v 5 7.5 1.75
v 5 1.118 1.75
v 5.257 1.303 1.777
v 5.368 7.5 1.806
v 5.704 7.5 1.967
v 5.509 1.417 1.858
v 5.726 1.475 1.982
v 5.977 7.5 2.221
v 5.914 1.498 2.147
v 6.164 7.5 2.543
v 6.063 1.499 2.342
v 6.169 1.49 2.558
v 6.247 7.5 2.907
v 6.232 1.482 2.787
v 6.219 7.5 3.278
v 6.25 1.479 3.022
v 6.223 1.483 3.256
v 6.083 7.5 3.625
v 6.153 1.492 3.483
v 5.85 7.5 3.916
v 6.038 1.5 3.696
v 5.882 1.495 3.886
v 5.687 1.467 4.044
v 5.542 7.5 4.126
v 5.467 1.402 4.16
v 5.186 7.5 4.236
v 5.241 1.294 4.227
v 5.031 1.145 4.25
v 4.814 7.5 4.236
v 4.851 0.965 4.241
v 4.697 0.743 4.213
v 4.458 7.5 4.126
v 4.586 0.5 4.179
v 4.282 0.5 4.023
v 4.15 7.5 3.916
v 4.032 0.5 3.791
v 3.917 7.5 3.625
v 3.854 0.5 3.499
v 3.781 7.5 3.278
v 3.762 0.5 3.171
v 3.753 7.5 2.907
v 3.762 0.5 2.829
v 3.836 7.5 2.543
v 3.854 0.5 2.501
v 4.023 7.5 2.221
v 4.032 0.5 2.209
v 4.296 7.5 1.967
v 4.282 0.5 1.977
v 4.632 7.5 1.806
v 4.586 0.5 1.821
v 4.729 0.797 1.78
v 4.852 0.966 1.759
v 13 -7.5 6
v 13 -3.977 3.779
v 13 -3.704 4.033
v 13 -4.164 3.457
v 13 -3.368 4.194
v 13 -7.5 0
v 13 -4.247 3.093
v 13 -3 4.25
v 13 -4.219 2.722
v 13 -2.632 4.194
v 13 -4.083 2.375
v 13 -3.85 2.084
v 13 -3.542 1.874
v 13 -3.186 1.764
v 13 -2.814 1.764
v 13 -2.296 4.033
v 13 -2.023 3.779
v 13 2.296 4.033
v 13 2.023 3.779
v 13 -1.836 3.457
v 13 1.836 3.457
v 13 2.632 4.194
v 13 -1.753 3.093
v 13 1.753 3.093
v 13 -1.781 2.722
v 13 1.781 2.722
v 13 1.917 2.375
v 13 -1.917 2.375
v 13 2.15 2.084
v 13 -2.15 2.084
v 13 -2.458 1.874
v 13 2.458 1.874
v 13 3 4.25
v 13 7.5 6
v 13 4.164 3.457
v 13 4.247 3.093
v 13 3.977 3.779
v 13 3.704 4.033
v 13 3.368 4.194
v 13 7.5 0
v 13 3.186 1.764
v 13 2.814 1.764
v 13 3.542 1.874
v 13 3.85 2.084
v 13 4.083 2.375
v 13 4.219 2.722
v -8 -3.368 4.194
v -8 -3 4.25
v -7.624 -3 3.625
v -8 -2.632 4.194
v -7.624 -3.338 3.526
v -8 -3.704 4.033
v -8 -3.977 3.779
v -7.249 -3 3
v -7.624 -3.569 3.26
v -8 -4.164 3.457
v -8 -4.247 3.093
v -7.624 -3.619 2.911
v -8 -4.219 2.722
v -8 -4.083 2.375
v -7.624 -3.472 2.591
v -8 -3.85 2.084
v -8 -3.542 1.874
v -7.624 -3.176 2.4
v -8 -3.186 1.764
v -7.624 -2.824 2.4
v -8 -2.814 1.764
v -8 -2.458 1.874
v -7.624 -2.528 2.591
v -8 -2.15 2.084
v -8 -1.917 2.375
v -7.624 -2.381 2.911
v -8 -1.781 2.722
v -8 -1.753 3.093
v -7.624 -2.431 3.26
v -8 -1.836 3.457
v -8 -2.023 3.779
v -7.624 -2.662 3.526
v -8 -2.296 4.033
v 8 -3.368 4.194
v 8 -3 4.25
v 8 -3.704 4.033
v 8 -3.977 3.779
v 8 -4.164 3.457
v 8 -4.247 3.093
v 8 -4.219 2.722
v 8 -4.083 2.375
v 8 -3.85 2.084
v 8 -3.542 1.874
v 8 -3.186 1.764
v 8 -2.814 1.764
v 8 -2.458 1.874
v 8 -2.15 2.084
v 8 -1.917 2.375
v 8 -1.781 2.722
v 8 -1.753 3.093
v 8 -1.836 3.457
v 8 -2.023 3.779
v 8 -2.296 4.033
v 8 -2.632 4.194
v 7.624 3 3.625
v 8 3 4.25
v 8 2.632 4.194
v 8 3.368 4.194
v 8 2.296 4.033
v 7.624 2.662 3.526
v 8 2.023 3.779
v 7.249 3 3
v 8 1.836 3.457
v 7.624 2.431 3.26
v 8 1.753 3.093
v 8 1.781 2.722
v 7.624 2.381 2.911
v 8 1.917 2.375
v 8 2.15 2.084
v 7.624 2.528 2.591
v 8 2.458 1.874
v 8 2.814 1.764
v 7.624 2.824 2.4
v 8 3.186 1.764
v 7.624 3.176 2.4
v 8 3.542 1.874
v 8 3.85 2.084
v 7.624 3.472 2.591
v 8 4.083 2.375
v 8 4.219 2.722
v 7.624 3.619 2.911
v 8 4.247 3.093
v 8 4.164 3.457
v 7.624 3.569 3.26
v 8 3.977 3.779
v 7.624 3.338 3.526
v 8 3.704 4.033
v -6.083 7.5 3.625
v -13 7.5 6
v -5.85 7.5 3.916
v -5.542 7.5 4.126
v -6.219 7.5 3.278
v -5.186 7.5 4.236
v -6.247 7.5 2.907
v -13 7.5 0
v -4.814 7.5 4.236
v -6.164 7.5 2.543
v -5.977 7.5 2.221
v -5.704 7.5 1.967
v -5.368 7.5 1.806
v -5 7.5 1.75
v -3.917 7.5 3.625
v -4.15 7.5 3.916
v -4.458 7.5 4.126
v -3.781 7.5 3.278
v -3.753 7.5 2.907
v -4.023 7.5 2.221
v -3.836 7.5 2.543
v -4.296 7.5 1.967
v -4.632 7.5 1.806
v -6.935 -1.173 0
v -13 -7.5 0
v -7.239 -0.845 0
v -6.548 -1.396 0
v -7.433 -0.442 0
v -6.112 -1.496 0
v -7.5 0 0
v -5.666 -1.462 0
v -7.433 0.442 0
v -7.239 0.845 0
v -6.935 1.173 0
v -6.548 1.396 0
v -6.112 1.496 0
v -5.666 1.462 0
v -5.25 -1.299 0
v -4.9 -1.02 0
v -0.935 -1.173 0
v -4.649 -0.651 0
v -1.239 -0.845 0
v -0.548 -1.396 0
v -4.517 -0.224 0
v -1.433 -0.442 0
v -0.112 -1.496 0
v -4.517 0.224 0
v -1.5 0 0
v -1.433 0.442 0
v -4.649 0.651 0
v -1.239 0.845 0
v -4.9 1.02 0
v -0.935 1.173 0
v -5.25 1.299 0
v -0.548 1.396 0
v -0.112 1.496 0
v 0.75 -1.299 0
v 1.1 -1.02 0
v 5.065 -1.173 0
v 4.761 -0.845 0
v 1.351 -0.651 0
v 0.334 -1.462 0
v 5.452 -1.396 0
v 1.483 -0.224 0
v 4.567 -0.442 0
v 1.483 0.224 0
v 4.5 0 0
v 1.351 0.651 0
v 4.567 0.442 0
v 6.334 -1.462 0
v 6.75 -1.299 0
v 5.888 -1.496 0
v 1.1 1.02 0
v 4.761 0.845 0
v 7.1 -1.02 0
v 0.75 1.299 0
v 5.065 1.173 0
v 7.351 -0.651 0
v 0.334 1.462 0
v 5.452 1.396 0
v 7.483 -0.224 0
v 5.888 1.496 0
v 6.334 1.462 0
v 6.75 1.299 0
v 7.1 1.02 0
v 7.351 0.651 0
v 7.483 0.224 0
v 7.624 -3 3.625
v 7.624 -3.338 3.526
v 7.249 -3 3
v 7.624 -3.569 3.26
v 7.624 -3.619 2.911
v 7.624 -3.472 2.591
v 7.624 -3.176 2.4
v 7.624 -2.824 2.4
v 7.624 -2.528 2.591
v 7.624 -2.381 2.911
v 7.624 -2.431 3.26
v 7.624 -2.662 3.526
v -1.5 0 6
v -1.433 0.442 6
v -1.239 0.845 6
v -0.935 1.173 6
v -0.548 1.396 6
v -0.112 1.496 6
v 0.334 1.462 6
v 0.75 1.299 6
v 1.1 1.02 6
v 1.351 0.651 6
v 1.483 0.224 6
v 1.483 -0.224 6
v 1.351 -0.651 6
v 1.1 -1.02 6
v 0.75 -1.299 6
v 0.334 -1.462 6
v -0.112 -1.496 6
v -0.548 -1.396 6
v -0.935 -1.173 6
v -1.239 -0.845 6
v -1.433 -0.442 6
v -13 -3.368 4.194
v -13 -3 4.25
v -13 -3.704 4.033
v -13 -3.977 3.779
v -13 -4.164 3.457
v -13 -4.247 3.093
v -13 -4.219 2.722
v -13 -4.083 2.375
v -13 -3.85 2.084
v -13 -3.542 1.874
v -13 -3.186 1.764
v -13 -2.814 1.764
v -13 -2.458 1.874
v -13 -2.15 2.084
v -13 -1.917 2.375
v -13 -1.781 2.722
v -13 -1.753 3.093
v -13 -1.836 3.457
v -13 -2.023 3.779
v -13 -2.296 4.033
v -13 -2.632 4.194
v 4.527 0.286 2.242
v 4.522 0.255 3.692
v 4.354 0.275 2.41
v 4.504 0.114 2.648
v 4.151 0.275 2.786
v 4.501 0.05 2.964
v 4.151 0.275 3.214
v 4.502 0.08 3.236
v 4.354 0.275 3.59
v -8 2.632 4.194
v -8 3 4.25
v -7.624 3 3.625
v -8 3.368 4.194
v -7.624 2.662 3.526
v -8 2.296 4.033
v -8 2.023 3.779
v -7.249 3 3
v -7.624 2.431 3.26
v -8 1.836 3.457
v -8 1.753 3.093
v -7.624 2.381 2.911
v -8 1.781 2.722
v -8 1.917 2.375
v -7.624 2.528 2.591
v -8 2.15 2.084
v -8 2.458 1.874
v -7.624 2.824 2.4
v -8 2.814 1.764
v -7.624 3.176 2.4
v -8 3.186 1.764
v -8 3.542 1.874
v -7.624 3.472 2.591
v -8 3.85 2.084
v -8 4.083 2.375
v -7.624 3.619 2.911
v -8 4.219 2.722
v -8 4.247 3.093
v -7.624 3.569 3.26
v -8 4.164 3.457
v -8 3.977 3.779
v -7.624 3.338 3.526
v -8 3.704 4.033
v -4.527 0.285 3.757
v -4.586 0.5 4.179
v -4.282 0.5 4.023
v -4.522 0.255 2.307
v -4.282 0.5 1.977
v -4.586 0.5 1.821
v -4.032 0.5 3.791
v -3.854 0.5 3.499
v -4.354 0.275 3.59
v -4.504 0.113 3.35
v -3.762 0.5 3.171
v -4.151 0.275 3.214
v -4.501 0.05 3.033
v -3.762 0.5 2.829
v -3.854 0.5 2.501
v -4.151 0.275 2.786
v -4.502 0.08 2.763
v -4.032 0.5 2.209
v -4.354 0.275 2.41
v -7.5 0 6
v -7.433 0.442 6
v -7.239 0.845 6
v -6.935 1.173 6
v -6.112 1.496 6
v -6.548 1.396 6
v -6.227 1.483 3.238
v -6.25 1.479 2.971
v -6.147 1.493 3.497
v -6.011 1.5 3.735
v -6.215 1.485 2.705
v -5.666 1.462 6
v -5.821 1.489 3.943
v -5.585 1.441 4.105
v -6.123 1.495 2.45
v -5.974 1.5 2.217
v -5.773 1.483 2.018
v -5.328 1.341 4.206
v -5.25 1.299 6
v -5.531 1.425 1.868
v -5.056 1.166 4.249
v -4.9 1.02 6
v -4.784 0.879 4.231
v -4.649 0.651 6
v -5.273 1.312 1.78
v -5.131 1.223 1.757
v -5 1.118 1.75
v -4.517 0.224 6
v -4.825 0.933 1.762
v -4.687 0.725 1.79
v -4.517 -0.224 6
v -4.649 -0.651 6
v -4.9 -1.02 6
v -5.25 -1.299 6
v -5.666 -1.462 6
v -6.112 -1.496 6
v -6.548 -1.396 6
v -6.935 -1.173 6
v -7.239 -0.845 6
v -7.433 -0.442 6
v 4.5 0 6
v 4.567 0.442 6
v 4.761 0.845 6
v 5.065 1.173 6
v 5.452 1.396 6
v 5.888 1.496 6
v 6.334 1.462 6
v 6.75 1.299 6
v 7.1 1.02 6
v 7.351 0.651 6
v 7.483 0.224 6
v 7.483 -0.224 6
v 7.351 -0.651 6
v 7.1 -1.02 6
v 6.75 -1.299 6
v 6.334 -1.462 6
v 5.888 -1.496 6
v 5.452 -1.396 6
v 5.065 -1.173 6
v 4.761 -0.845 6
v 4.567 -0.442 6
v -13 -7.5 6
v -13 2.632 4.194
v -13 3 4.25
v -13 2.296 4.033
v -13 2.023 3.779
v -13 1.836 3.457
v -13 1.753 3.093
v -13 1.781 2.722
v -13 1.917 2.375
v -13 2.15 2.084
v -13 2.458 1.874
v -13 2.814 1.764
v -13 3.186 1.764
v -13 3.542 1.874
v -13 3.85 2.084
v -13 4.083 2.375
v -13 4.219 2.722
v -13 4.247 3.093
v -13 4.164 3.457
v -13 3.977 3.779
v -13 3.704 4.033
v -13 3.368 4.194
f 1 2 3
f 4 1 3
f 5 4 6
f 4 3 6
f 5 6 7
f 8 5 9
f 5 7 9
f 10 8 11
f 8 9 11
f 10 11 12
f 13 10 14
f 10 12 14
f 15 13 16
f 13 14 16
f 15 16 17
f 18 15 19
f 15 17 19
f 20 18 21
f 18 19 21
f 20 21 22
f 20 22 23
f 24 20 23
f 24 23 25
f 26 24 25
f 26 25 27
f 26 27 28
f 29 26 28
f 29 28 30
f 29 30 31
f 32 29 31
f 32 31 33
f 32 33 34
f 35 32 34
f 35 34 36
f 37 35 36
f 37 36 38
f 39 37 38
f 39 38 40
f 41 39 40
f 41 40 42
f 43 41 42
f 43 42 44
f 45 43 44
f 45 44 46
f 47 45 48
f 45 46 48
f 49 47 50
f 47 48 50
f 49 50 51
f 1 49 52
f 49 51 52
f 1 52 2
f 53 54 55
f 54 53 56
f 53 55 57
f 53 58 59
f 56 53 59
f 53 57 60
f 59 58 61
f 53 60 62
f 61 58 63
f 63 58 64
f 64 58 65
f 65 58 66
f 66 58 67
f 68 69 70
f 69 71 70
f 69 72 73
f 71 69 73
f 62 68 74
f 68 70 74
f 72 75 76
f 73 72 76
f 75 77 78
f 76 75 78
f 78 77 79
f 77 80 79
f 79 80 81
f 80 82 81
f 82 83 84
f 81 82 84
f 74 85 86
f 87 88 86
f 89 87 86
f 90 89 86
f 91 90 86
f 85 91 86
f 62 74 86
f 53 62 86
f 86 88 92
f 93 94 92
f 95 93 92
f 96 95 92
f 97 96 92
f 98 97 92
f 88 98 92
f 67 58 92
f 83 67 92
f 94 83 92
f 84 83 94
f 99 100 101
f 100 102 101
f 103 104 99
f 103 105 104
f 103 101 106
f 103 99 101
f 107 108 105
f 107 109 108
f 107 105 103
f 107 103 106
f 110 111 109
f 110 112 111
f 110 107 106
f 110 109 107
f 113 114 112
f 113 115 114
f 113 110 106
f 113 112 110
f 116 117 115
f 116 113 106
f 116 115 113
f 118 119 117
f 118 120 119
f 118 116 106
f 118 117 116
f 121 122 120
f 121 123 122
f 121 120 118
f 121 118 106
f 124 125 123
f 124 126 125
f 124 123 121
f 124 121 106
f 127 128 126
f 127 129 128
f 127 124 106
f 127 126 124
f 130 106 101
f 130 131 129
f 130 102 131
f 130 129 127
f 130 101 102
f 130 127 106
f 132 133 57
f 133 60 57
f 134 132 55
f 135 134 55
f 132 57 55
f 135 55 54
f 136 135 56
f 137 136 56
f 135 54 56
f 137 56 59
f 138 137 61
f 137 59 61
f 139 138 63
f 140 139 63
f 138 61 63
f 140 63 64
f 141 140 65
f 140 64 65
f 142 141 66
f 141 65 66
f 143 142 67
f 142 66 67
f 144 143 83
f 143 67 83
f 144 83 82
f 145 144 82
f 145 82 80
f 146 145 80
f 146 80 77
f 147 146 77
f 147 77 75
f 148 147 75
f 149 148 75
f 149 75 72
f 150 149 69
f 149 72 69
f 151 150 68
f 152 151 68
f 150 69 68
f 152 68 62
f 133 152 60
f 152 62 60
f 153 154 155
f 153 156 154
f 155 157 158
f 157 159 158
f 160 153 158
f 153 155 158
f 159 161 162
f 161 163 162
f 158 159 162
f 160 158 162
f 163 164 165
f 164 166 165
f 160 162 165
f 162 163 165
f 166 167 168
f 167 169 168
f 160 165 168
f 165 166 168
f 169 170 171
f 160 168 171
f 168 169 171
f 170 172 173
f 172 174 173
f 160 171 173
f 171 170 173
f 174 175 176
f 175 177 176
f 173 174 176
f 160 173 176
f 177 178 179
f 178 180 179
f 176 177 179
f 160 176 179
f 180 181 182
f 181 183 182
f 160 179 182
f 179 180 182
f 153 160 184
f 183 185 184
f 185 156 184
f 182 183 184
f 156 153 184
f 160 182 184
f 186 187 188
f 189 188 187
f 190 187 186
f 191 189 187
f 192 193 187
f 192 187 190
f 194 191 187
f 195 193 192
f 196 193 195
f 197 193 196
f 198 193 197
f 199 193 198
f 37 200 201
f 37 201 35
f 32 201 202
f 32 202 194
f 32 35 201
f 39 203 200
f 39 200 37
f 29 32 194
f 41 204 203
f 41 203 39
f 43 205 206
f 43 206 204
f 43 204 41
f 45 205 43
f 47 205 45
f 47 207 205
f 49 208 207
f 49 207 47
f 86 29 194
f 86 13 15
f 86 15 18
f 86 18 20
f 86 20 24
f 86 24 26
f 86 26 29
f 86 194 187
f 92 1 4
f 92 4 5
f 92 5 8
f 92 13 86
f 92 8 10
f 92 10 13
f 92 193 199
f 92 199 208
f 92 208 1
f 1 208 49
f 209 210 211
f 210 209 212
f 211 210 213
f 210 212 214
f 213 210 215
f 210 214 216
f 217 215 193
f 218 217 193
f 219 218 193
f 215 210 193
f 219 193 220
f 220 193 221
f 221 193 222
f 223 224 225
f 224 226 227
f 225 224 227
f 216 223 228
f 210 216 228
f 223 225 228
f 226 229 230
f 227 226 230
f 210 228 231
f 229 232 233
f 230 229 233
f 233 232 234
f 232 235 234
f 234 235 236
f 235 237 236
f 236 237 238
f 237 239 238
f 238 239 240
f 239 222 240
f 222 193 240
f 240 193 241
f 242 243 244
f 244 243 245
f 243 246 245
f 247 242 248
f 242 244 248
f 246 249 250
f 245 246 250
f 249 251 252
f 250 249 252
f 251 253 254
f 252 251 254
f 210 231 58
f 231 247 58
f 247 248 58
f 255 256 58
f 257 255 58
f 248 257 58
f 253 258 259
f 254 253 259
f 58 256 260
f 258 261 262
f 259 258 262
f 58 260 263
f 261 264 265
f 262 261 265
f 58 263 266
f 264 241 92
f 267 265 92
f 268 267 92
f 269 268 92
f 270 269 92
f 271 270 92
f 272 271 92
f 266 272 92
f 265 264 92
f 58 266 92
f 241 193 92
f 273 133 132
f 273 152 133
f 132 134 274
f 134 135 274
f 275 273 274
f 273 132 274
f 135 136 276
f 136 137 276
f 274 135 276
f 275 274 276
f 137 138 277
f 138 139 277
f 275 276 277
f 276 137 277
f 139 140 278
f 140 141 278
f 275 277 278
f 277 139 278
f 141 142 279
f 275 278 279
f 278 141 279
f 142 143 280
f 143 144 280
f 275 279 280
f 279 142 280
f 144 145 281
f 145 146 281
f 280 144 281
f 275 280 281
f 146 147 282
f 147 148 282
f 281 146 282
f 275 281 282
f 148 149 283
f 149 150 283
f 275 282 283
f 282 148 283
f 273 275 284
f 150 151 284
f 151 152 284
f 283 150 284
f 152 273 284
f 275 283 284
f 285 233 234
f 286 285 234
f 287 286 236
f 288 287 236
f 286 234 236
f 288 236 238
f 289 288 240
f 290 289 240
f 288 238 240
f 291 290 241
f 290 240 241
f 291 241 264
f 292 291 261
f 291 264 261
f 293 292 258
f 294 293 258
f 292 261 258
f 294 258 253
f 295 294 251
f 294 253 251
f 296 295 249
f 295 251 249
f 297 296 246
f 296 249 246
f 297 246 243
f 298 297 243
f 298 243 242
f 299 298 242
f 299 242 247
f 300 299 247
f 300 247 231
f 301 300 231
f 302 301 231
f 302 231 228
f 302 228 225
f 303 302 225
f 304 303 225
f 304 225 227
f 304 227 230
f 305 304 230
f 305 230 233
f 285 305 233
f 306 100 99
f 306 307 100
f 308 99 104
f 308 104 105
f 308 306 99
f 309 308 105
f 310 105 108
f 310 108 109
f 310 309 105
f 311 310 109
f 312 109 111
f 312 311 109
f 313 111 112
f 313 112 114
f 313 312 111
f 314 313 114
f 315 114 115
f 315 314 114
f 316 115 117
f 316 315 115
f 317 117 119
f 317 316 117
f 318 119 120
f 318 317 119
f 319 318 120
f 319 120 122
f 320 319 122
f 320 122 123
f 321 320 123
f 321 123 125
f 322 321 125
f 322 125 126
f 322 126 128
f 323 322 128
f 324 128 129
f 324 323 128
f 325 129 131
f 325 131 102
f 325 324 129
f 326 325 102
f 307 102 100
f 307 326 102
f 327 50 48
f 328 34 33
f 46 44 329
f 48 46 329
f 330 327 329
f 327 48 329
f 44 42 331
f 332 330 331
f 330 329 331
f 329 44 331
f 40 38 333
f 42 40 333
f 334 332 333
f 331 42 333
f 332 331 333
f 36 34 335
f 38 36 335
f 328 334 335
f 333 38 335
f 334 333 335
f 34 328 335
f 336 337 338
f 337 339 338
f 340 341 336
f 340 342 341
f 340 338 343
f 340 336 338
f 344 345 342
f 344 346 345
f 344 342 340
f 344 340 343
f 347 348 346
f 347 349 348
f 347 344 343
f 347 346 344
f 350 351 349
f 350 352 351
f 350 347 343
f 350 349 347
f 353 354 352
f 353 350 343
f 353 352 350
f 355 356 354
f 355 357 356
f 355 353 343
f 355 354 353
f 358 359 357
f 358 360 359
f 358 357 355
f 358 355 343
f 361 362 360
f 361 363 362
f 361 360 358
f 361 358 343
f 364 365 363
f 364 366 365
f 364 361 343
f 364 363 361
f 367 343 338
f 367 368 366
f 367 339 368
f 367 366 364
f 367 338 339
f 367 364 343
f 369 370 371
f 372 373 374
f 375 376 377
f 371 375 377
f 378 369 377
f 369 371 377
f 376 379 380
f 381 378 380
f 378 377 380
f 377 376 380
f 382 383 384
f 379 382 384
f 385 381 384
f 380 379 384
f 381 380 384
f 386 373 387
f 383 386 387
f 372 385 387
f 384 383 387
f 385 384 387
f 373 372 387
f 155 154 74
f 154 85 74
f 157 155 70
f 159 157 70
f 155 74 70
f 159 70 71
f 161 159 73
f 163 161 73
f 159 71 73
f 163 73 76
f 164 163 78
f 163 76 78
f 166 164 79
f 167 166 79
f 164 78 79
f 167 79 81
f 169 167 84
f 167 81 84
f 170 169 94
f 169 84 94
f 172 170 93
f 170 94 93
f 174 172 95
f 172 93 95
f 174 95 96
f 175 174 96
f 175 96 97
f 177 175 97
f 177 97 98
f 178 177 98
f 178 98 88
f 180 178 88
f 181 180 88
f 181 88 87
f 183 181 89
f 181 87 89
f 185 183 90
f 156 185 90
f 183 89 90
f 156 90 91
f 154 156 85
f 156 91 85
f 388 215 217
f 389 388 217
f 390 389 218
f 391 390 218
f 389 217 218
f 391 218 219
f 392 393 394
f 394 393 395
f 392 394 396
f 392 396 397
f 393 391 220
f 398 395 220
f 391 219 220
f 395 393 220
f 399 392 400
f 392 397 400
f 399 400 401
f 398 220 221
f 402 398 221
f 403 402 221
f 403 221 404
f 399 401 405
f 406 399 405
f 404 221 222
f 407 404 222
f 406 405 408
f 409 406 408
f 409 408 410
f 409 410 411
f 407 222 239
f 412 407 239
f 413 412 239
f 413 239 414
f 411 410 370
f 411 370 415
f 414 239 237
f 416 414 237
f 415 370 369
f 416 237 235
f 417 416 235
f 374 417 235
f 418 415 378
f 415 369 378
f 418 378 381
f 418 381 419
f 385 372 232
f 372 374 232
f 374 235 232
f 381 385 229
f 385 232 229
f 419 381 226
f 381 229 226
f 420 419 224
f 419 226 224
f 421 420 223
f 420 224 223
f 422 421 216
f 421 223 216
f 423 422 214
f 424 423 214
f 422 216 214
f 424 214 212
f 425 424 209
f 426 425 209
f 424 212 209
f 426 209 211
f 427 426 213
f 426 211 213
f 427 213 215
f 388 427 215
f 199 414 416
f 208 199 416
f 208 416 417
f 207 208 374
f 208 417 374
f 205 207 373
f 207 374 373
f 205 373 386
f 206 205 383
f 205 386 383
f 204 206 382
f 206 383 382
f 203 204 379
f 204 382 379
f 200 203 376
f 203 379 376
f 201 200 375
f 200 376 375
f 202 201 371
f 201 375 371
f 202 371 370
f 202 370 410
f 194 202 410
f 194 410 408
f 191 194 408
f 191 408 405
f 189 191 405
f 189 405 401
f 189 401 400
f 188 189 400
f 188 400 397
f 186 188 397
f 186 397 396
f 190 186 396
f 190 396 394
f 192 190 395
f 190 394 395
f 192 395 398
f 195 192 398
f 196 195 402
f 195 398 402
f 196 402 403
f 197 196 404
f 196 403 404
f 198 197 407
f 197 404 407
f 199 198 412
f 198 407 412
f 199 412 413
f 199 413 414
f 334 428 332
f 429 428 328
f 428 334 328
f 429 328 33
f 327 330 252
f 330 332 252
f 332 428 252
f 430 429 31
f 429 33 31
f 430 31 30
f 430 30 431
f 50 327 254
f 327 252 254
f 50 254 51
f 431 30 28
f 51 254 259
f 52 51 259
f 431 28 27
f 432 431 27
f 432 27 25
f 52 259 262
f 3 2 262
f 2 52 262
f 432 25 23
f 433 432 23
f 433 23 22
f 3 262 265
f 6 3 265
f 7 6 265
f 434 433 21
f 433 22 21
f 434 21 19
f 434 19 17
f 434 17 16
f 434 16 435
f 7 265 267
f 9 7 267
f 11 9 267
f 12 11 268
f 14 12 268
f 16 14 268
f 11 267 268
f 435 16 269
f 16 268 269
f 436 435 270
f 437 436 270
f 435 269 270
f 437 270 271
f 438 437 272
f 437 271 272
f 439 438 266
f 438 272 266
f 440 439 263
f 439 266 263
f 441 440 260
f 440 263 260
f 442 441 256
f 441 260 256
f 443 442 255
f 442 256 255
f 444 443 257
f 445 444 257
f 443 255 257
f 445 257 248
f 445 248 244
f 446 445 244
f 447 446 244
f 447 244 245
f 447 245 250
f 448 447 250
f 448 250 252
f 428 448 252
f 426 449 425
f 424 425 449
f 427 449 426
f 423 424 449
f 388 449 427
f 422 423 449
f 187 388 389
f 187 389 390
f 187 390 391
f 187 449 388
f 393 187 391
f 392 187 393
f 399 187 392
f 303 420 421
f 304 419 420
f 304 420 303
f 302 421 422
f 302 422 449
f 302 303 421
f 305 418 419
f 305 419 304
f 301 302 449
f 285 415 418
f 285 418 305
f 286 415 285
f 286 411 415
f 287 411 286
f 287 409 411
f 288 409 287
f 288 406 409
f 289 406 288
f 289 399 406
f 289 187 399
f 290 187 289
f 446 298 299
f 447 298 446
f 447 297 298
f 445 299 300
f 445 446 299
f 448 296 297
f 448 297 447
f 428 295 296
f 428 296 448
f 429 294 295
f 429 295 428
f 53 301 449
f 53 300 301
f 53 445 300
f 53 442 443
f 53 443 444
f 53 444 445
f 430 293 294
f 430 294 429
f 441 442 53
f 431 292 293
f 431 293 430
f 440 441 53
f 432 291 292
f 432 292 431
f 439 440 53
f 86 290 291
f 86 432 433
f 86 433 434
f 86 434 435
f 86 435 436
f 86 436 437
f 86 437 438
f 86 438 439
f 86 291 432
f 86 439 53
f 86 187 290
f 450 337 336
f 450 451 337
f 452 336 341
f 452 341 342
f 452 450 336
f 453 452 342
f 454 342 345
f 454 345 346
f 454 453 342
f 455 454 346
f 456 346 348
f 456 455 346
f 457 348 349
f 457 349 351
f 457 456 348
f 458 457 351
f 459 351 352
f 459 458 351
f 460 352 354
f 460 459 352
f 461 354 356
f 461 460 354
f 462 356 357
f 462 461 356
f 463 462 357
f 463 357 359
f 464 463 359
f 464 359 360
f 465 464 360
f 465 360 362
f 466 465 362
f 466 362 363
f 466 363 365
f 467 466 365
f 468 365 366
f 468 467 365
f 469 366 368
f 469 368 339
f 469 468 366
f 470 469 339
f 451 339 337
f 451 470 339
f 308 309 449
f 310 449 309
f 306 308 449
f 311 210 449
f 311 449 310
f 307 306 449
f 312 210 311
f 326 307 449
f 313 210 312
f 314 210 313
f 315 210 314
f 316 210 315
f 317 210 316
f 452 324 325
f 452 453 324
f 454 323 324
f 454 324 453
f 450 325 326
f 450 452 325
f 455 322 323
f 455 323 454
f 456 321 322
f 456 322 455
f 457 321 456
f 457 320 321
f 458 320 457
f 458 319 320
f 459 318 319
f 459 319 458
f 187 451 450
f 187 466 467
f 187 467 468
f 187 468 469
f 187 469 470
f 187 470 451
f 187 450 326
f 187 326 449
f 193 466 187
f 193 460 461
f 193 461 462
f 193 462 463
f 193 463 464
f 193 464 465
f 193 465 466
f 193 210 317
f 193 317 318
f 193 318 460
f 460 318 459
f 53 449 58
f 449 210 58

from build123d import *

# Parameters (mm, degrees)
SKETCH_1_W                  = 26
SKETCH_1_H                  = 15
EXTRUDE_1_DEPTH             = 5
SKETCH_2_W                  = 26
SKETCH_2_H                  = 15
EXTRUDE_2_DEPTH             = 1
HOLE_WIZARD_M3_1_AT_2_COUNT = 2
HOLE_WIZARD_M3_1_AT_2_PITCH = 6
SKETCH_5_R                  = 1.5
CUT_EXTRUDE_1_DEPTH         = 7
HOLE_WIZARD_M3_2_D          = 2.5
HOLE_WIZARD_M3_2_DEPTH      = 7
HOLE_WIZARD_M3_2_TIP        = 0.751075774


with BuildPart() as part:
    # 草图1 → 凸台-拉伸1 (new body)
    with BuildSketch(Plane.XY):
        Rectangle(SKETCH_1_W, SKETCH_1_H)
    extrude(amount=EXTRUDE_1_DEPTH)

    # 草图2 → 凸台-拉伸2 (add)
    with BuildSketch(Plane.XY.offset(5)):
        Rectangle(SKETCH_2_W, SKETCH_2_H)
    extrude(amount=EXTRUDE_2_DEPTH)

    # 草图4 → M3 螺纹孔1 (revolve, cut)
    with BuildSketch(Plane(origin=(-13, -3, 3), x_dir=(0, 0, 1), z_dir=(0, 1, 0))):
        Polygon((0, 0), (0, 5.751075774), (1.25, 5), (1.25, 0), align=None)
    hole_wizard_m3_1 = revolve(axis=Axis((-19.35, -3, 3), (1, 0, 0)), mode=Mode.SUBTRACT)

    # M3 螺纹孔1 at 2: M3 螺纹孔1 ×2
    with Locations(*[(0, i * HOLE_WIZARD_M3_1_AT_2_PITCH, 0) for i in range(1, HOLE_WIZARD_M3_1_AT_2_COUNT)]):
        add(hole_wizard_m3_1, mode=Mode.SUBTRACT)

    # 镜向1: M3 螺纹孔1 across plane
    add(hole_wizard_m3_1.mirror(Plane(origin=(0, 0, 0), x_dir=(0, 0, 1), z_dir=(1, 0, 0))), mode=Mode.SUBTRACT)

    # 镜向1 copy 1 sketch → 镜向1 copy 1 (revolve, cut)
    with BuildSketch(Plane(origin=(13, 3, 3), x_dir=(0, 0, 1), z_dir=(0, 1, 0))):
        Polygon((0, 0), (0, -5.751075774), (1.25, -5), (1.25, 0), align=None)
    revolve(axis=Axis((19.35, 3, 3), (1, 0, 0)), mode=Mode.SUBTRACT)

    # 草图5 → 切除-拉伸1 (cut)
    with BuildSketch(Plane(origin=(0, 0, 0), x_dir=(-1, 0, 0), z_dir=(0, 0, -1))):
        with Locations((6, 0)):
            Circle(SKETCH_5_R)
        Circle(SKETCH_5_R)
        with Locations((-6, 0)):
            Circle(SKETCH_5_R)
    extrude(amount=-CUT_EXTRUDE_1_DEPTH, mode=Mode.SUBTRACT)

    # M3 螺纹孔2
    with Locations(Plane(origin=(5, 7.5, 3), x_dir=(0, 0, 1), z_dir=(0, 1, 0))):
        with Locations((0, 0), (0, -10)):
            Hole(HOLE_WIZARD_M3_2_D / 2, depth=HOLE_WIZARD_M3_2_DEPTH)
            with Locations((0, 0, -(HOLE_WIZARD_M3_2_DEPTH + HOLE_WIZARD_M3_2_TIP / 2))):  # 118° drill point
                Cone(0, HOLE_WIZARD_M3_2_D / 2, HOLE_WIZARD_M3_2_TIP, mode=Mode.SUBTRACT)


solid = part.part
